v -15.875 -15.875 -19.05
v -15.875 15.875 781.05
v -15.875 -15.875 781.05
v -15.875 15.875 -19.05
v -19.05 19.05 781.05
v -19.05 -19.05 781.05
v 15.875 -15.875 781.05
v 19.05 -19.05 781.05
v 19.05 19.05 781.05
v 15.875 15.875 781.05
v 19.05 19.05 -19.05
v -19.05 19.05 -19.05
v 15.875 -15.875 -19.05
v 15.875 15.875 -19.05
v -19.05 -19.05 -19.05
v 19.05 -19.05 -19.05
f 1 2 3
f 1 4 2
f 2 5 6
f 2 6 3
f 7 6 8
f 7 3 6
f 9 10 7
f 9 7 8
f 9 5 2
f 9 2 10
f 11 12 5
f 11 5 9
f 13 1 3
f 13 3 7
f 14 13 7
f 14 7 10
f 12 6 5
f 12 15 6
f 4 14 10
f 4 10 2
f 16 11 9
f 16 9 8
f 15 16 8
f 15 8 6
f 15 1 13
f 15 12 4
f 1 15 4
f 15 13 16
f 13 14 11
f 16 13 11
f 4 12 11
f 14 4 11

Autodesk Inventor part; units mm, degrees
ref_plane "Start Plane" through (0, 0, -19.05) normal (0, 0, 1) x (1, 0, 0)
ref_plane "End Plane" through (0, 0, 781.05) normal (0, 0, 1) x (1, 0, 0)
sketch "Sketch" plane through (0, 0, 0) normal (0, 0, 1) x (1, 0, 0)
  line L0 (-19.05, 19.05) -> (19.05, 19.05)
  line L1 (19.05, 19.05) -> (19.05, -19.05)
  line L2 (19.05, -19.05) -> (-19.05, -19.05)
  line L3 (-19.05, -19.05) -> (-19.05, 19.05)
  line L4 (15.875, 15.875) -> (-15.875, 15.875)
  line L5 (-15.875, 15.875) -> (-15.875, -15.875)
  line L6 (-15.875, -15.875) -> (15.875, -15.875)
  line L7 (15.875, -15.875) -> (15.875, 15.875)
  point P0 (0, 0)
  point P1 (0, 19.05)
  point P2 (-19.05, 0)
  dimension "width" = 38.1
  dimension "d1" = 3.175
extrude "Body" add sketch "Sketch" along normal up to surface (800.1 mm away) from surface at -19.05
sketch "Sketch4" plane through (0, 0, 0) normal (0, 0, 1) x (1, 0, 0)
  line L0 (0, 0) -> (10, 0)
ref_plane "Work Plane4" through (0, 0, 0) normal (0, -1, 0) x (1, 0, 0)
sketch "Sketch5" plane through (0, 0, 0) normal (0, -1, 0) x (1, 0, 0)
  line L0 (-2, -19.05) -> (12, -19.05)
  line L1 (-2, 781.05) -> (12, 781.05)
  dimension "d9" = 800.1
ref_plane "Work Plane5" through (0, 12.7, 781.05) normal (0, 0, 1) x (1, 0, 0)
split "Split1" plane through (0, 12.7, 781.05) removes the side toward (0, 0, 1)
ref_plane "Work Plane6" through (0, -12.7, -19.05) normal (0, 0, -1) x (-1, 0, 0)
split "Split2" plane through (0, -12.7, -19.05) removes the side toward (0, 0, -1)
equation "\"G_OFFSET_START\" = 19.05"
equation "\"G_OFFSET_END\" = 19.05"
equation "\"d4\" = -G_OFFSET_START"
equation "\"d5\" = length + G_OFFSET_END"
equation "\"G_L\" = 762"
equation "\"length\" = 762"
properties part number "1.5x1.5x.125 Tube" material "Aluminum-6061"
